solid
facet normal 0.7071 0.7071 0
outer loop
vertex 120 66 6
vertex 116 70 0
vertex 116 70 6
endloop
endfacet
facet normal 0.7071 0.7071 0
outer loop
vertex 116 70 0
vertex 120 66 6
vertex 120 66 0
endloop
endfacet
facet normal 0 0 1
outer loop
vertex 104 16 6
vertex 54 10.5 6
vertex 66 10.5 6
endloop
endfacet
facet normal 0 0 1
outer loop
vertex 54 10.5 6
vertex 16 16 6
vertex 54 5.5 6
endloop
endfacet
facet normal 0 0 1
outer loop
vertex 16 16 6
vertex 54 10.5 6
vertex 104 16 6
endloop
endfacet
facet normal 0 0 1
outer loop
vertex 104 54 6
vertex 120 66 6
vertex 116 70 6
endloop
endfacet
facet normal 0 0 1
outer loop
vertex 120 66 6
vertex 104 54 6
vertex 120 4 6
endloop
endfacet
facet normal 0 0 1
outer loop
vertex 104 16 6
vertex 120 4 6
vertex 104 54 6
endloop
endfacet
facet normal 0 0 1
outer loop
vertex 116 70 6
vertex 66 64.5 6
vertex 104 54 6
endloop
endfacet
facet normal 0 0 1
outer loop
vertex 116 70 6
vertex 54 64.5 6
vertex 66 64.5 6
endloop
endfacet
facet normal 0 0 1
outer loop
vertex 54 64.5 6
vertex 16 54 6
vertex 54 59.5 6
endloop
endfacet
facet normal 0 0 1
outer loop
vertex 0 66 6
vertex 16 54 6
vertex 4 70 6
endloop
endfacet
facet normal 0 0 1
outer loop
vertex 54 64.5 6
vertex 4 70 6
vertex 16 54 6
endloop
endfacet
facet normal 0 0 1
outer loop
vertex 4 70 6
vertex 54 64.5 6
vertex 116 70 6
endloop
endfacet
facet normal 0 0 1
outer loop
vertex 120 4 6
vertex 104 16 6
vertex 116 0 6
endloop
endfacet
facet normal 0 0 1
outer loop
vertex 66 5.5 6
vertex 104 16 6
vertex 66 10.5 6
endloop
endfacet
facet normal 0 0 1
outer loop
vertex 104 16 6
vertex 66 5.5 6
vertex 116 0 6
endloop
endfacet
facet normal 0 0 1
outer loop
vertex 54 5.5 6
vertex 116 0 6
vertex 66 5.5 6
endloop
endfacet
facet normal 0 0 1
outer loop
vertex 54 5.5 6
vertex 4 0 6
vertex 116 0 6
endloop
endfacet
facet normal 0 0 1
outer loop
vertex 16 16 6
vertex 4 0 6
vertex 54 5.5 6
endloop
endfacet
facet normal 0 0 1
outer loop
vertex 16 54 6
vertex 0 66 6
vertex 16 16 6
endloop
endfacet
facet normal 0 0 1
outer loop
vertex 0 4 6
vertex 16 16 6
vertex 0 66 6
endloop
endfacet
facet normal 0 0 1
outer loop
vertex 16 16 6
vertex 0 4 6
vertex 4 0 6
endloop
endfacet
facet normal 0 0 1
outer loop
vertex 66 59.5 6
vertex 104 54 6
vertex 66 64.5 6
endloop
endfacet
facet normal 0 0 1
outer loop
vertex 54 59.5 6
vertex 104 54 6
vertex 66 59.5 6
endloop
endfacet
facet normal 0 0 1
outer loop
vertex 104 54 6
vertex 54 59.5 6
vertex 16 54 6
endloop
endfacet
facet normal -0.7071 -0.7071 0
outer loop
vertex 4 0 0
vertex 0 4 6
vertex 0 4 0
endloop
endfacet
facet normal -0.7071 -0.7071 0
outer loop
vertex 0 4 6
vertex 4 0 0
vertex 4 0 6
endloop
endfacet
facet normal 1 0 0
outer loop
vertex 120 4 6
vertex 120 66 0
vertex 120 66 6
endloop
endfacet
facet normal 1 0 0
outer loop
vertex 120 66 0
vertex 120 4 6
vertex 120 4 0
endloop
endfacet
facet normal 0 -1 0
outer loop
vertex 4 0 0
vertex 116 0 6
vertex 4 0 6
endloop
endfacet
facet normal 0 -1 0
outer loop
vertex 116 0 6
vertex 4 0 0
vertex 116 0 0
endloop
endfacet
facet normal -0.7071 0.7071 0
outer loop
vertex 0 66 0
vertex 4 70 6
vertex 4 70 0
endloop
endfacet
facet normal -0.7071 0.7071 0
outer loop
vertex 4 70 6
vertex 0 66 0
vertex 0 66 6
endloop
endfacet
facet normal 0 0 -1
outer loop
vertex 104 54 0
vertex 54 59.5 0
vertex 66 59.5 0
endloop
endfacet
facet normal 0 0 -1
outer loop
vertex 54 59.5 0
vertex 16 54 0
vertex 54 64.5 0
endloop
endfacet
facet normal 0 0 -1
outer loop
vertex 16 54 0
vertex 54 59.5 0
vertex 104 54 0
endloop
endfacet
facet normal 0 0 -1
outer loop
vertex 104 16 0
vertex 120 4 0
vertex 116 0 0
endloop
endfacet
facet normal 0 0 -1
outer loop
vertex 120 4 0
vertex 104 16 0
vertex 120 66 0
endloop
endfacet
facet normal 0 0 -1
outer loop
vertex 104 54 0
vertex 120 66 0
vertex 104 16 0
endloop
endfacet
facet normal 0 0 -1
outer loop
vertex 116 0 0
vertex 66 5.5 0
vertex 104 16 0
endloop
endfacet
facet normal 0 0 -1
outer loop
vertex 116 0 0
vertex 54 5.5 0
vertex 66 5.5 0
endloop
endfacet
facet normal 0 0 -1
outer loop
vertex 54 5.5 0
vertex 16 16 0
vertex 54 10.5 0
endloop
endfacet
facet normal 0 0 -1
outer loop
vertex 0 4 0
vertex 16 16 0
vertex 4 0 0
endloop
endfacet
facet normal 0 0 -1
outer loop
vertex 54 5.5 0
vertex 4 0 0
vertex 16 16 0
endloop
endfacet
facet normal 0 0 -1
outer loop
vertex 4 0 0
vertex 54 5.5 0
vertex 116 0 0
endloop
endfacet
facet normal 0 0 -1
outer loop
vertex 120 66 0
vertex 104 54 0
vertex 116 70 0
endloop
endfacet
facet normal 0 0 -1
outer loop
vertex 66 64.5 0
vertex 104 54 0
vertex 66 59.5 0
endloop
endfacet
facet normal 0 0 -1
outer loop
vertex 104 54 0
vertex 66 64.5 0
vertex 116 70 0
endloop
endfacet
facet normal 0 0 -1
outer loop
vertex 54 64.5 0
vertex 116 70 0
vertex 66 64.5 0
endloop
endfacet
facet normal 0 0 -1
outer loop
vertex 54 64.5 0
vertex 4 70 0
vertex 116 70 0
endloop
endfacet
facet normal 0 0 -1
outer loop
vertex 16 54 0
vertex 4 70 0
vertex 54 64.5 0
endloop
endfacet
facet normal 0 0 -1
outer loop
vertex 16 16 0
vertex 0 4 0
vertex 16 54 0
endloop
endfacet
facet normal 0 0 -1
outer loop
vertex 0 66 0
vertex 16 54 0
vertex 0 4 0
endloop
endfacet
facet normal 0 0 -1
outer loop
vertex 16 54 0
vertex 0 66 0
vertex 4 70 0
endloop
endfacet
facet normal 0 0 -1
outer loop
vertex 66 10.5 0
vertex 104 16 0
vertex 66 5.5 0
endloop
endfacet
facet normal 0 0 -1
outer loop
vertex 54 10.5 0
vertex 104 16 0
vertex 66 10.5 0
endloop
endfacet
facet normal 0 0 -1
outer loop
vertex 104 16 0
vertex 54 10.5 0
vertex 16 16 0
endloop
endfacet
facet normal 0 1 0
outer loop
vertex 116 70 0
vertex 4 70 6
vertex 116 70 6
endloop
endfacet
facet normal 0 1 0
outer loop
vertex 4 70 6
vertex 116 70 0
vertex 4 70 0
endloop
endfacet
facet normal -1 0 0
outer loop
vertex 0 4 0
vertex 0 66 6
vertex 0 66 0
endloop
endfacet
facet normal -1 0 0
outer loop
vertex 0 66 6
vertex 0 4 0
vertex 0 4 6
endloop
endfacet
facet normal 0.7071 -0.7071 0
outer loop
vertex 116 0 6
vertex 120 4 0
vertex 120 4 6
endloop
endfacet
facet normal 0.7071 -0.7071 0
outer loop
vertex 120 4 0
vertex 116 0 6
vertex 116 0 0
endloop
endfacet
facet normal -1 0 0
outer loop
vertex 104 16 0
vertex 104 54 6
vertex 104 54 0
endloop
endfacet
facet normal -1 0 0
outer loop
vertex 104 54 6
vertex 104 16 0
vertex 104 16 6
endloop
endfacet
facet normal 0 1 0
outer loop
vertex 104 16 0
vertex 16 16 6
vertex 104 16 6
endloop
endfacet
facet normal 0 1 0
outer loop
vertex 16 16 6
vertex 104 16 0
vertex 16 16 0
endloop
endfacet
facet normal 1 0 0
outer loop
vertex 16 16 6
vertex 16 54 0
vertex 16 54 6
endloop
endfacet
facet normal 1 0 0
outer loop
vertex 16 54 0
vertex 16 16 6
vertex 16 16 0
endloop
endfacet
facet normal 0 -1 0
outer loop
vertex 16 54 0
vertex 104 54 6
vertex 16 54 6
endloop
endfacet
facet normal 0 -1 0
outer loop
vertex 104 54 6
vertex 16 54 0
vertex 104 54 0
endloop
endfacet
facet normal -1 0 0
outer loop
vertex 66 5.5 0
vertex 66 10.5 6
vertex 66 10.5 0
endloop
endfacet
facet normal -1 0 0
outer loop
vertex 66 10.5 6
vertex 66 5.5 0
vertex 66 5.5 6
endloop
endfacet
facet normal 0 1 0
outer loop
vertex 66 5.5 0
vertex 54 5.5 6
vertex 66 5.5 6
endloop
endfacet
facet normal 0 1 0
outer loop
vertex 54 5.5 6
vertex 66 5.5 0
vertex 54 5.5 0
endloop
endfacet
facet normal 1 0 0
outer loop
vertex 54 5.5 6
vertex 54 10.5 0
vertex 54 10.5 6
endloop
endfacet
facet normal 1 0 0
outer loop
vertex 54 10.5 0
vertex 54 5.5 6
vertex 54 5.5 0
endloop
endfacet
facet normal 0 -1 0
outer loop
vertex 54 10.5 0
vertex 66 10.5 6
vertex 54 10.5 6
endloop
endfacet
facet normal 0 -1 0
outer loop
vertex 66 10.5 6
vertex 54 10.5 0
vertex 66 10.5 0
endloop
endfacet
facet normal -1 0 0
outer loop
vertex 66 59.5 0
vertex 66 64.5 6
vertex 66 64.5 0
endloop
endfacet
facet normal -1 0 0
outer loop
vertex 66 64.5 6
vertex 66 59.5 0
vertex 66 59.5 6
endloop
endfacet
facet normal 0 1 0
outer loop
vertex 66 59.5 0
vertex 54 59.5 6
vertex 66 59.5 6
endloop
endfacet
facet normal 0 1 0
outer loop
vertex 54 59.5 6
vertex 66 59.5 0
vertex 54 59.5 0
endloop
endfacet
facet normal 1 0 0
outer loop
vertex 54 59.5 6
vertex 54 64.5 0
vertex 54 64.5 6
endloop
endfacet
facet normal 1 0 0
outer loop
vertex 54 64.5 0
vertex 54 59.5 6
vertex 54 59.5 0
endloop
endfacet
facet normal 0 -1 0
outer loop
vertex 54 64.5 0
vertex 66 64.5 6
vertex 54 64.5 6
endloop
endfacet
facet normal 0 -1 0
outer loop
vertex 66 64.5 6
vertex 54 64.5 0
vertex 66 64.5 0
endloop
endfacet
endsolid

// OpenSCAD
$fn = 32;

// ----------------------------------------------------------------------
// Frame plate: 120 x 70 frame, 16 mm rails
// ----------------------------------------------------------------------

// --- parameters (mm) ---
plate_l = 120;            // plate length, X
plate_w = 70;             // plate width, Y
plate_t = 6;              // plate thickness, Z (extrusion height)
corner_c = 4;             // corner chamfer
frame_bar = 16;           // frame rail width
slot_l = 12;              // adjustment slot length
slot_w = 5;               // adjustment slot width

win_l = plate_l - 2 * frame_bar;  // window length
win_w = plate_w - 2 * frame_bar;  // window width

profile = [[4, 0], [116, 0], [120, 4], [120, 66], [116, 70], [4, 70], [0, 66], [0, 4]];  // primary outline, 8 points, counter clockwise
void_1 = [[16, 16], [104, 16], [104, 54], [16, 54]];  // the window, 4 points
void_2 = [[54, 5.5], [66, 5.5], [66, 10.5], [54, 10.5]];  // adjustment slot, 4 points
void_3 = [[54, 59.5], [66, 59.5], [66, 64.5], [54, 64.5]];  // adjustment slot, 4 points

// --- the one profile operation ---
difference() {
  linear_extrude(height = plate_t) polygon(points = profile);
  translate([0, 0, -1])
    linear_extrude(height = plate_t + 2) polygon(points = void_1);
  translate([0, 0, -1])
    linear_extrude(height = plate_t + 2) polygon(points = void_2);
  translate([0, 0, -1])
    linear_extrude(height = plate_t + 2) polygon(points = void_3);
}
